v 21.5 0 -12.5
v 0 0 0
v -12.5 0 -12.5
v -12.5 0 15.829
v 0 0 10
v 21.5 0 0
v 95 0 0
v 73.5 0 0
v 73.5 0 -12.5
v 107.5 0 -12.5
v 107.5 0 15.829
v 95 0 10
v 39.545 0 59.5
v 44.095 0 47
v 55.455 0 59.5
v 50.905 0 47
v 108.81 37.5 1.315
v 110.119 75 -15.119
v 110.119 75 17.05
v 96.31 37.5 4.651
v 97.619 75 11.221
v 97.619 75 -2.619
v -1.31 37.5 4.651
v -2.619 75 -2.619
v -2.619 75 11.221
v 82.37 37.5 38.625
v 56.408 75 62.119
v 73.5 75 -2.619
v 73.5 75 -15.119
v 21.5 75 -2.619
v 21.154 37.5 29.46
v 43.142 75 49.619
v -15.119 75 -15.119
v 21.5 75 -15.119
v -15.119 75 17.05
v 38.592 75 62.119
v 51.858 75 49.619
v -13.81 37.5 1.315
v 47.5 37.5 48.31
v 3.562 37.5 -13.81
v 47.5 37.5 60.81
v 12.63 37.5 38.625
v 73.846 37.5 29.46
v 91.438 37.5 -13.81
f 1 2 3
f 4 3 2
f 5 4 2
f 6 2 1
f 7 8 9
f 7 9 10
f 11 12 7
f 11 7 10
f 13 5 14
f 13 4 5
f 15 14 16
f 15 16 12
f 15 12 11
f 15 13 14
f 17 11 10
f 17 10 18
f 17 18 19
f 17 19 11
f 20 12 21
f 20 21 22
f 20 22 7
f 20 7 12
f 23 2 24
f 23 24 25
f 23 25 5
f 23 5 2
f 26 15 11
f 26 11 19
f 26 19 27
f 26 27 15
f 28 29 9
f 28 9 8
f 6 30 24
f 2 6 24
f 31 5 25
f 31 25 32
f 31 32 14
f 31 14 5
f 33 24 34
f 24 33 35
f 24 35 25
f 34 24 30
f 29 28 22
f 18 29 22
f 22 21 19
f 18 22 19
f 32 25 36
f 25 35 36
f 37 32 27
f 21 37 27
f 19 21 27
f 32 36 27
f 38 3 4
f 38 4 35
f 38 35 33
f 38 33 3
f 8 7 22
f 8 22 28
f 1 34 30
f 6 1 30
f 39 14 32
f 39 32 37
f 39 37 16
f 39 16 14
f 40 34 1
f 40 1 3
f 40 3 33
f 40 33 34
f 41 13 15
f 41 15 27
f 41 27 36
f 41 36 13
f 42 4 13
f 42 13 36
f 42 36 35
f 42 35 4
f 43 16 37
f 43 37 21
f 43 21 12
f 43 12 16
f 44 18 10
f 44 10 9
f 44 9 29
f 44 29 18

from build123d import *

# Parameters (mm, degrees)
SALIENTE_EXTRUIR1_DEPTH = 75
SALIENTE_EXTRUIR1_TAPER = -2
CORTAR_EXTRUIR1_DEPTH   = 76.0000001
CORTAR_EXTRUIR1_TAPER   = 2
CROQUIS5_W              = 52
CROQUIS5_H              = 12.5
CORTAR_EXTRUIR2_DEPTH   = 76.046325467


with BuildPart() as part:
    # Croquis2 → Saliente-Extruir1 (new body)
    with BuildSketch(Plane(origin=(0, 0, 0), x_dir=(1, 0, 0), z_dir=(0, 1, 0))):
        Polygon((-12.5, 12.5), (-12.5, -15.828845727), (39.545254998, -59.5), (55.454745002, -59.5), (107.5, -15.828845727), (107.5, 12.5), align=None)
    extrude(amount=SALIENTE_EXTRUIR1_DEPTH, taper=SALIENTE_EXTRUIR1_TAPER)

    # Croquis3 → Cortar-Extruir1 (cut, through all)
    with BuildSketch(Plane(origin=(0, 75, 0), x_dir=(1, 0, 0), z_dir=(0, 1, 0))):
        Polygon((-2.619057712, 2.619057712), (-2.619057712, -11.221286668), (43.141623877, -49.619057712), (51.858376123, -49.619057712), (97.619057712, -11.221286668), (97.619057712, 2.619057712), align=None)
    extrude(amount=-CORTAR_EXTRUIR1_DEPTH, taper=CORTAR_EXTRUIR1_TAPER, mode=Mode.SUBTRACT)

    # Croquis5 → Cortar-Extruir2 (cut, through all, along a direction that is not the sketch's normal)
    with BuildSketch(Plane.XZ):
        with Locations((47.5, -6.25)):
            Rectangle(CROQUIS5_W, CROQUIS5_H)
    extrude(amount=-CORTAR_EXTRUIR2_DEPTH, dir=(0, -0.999390827, 0.034899497), mode=Mode.SUBTRACT)


solid = part.part
